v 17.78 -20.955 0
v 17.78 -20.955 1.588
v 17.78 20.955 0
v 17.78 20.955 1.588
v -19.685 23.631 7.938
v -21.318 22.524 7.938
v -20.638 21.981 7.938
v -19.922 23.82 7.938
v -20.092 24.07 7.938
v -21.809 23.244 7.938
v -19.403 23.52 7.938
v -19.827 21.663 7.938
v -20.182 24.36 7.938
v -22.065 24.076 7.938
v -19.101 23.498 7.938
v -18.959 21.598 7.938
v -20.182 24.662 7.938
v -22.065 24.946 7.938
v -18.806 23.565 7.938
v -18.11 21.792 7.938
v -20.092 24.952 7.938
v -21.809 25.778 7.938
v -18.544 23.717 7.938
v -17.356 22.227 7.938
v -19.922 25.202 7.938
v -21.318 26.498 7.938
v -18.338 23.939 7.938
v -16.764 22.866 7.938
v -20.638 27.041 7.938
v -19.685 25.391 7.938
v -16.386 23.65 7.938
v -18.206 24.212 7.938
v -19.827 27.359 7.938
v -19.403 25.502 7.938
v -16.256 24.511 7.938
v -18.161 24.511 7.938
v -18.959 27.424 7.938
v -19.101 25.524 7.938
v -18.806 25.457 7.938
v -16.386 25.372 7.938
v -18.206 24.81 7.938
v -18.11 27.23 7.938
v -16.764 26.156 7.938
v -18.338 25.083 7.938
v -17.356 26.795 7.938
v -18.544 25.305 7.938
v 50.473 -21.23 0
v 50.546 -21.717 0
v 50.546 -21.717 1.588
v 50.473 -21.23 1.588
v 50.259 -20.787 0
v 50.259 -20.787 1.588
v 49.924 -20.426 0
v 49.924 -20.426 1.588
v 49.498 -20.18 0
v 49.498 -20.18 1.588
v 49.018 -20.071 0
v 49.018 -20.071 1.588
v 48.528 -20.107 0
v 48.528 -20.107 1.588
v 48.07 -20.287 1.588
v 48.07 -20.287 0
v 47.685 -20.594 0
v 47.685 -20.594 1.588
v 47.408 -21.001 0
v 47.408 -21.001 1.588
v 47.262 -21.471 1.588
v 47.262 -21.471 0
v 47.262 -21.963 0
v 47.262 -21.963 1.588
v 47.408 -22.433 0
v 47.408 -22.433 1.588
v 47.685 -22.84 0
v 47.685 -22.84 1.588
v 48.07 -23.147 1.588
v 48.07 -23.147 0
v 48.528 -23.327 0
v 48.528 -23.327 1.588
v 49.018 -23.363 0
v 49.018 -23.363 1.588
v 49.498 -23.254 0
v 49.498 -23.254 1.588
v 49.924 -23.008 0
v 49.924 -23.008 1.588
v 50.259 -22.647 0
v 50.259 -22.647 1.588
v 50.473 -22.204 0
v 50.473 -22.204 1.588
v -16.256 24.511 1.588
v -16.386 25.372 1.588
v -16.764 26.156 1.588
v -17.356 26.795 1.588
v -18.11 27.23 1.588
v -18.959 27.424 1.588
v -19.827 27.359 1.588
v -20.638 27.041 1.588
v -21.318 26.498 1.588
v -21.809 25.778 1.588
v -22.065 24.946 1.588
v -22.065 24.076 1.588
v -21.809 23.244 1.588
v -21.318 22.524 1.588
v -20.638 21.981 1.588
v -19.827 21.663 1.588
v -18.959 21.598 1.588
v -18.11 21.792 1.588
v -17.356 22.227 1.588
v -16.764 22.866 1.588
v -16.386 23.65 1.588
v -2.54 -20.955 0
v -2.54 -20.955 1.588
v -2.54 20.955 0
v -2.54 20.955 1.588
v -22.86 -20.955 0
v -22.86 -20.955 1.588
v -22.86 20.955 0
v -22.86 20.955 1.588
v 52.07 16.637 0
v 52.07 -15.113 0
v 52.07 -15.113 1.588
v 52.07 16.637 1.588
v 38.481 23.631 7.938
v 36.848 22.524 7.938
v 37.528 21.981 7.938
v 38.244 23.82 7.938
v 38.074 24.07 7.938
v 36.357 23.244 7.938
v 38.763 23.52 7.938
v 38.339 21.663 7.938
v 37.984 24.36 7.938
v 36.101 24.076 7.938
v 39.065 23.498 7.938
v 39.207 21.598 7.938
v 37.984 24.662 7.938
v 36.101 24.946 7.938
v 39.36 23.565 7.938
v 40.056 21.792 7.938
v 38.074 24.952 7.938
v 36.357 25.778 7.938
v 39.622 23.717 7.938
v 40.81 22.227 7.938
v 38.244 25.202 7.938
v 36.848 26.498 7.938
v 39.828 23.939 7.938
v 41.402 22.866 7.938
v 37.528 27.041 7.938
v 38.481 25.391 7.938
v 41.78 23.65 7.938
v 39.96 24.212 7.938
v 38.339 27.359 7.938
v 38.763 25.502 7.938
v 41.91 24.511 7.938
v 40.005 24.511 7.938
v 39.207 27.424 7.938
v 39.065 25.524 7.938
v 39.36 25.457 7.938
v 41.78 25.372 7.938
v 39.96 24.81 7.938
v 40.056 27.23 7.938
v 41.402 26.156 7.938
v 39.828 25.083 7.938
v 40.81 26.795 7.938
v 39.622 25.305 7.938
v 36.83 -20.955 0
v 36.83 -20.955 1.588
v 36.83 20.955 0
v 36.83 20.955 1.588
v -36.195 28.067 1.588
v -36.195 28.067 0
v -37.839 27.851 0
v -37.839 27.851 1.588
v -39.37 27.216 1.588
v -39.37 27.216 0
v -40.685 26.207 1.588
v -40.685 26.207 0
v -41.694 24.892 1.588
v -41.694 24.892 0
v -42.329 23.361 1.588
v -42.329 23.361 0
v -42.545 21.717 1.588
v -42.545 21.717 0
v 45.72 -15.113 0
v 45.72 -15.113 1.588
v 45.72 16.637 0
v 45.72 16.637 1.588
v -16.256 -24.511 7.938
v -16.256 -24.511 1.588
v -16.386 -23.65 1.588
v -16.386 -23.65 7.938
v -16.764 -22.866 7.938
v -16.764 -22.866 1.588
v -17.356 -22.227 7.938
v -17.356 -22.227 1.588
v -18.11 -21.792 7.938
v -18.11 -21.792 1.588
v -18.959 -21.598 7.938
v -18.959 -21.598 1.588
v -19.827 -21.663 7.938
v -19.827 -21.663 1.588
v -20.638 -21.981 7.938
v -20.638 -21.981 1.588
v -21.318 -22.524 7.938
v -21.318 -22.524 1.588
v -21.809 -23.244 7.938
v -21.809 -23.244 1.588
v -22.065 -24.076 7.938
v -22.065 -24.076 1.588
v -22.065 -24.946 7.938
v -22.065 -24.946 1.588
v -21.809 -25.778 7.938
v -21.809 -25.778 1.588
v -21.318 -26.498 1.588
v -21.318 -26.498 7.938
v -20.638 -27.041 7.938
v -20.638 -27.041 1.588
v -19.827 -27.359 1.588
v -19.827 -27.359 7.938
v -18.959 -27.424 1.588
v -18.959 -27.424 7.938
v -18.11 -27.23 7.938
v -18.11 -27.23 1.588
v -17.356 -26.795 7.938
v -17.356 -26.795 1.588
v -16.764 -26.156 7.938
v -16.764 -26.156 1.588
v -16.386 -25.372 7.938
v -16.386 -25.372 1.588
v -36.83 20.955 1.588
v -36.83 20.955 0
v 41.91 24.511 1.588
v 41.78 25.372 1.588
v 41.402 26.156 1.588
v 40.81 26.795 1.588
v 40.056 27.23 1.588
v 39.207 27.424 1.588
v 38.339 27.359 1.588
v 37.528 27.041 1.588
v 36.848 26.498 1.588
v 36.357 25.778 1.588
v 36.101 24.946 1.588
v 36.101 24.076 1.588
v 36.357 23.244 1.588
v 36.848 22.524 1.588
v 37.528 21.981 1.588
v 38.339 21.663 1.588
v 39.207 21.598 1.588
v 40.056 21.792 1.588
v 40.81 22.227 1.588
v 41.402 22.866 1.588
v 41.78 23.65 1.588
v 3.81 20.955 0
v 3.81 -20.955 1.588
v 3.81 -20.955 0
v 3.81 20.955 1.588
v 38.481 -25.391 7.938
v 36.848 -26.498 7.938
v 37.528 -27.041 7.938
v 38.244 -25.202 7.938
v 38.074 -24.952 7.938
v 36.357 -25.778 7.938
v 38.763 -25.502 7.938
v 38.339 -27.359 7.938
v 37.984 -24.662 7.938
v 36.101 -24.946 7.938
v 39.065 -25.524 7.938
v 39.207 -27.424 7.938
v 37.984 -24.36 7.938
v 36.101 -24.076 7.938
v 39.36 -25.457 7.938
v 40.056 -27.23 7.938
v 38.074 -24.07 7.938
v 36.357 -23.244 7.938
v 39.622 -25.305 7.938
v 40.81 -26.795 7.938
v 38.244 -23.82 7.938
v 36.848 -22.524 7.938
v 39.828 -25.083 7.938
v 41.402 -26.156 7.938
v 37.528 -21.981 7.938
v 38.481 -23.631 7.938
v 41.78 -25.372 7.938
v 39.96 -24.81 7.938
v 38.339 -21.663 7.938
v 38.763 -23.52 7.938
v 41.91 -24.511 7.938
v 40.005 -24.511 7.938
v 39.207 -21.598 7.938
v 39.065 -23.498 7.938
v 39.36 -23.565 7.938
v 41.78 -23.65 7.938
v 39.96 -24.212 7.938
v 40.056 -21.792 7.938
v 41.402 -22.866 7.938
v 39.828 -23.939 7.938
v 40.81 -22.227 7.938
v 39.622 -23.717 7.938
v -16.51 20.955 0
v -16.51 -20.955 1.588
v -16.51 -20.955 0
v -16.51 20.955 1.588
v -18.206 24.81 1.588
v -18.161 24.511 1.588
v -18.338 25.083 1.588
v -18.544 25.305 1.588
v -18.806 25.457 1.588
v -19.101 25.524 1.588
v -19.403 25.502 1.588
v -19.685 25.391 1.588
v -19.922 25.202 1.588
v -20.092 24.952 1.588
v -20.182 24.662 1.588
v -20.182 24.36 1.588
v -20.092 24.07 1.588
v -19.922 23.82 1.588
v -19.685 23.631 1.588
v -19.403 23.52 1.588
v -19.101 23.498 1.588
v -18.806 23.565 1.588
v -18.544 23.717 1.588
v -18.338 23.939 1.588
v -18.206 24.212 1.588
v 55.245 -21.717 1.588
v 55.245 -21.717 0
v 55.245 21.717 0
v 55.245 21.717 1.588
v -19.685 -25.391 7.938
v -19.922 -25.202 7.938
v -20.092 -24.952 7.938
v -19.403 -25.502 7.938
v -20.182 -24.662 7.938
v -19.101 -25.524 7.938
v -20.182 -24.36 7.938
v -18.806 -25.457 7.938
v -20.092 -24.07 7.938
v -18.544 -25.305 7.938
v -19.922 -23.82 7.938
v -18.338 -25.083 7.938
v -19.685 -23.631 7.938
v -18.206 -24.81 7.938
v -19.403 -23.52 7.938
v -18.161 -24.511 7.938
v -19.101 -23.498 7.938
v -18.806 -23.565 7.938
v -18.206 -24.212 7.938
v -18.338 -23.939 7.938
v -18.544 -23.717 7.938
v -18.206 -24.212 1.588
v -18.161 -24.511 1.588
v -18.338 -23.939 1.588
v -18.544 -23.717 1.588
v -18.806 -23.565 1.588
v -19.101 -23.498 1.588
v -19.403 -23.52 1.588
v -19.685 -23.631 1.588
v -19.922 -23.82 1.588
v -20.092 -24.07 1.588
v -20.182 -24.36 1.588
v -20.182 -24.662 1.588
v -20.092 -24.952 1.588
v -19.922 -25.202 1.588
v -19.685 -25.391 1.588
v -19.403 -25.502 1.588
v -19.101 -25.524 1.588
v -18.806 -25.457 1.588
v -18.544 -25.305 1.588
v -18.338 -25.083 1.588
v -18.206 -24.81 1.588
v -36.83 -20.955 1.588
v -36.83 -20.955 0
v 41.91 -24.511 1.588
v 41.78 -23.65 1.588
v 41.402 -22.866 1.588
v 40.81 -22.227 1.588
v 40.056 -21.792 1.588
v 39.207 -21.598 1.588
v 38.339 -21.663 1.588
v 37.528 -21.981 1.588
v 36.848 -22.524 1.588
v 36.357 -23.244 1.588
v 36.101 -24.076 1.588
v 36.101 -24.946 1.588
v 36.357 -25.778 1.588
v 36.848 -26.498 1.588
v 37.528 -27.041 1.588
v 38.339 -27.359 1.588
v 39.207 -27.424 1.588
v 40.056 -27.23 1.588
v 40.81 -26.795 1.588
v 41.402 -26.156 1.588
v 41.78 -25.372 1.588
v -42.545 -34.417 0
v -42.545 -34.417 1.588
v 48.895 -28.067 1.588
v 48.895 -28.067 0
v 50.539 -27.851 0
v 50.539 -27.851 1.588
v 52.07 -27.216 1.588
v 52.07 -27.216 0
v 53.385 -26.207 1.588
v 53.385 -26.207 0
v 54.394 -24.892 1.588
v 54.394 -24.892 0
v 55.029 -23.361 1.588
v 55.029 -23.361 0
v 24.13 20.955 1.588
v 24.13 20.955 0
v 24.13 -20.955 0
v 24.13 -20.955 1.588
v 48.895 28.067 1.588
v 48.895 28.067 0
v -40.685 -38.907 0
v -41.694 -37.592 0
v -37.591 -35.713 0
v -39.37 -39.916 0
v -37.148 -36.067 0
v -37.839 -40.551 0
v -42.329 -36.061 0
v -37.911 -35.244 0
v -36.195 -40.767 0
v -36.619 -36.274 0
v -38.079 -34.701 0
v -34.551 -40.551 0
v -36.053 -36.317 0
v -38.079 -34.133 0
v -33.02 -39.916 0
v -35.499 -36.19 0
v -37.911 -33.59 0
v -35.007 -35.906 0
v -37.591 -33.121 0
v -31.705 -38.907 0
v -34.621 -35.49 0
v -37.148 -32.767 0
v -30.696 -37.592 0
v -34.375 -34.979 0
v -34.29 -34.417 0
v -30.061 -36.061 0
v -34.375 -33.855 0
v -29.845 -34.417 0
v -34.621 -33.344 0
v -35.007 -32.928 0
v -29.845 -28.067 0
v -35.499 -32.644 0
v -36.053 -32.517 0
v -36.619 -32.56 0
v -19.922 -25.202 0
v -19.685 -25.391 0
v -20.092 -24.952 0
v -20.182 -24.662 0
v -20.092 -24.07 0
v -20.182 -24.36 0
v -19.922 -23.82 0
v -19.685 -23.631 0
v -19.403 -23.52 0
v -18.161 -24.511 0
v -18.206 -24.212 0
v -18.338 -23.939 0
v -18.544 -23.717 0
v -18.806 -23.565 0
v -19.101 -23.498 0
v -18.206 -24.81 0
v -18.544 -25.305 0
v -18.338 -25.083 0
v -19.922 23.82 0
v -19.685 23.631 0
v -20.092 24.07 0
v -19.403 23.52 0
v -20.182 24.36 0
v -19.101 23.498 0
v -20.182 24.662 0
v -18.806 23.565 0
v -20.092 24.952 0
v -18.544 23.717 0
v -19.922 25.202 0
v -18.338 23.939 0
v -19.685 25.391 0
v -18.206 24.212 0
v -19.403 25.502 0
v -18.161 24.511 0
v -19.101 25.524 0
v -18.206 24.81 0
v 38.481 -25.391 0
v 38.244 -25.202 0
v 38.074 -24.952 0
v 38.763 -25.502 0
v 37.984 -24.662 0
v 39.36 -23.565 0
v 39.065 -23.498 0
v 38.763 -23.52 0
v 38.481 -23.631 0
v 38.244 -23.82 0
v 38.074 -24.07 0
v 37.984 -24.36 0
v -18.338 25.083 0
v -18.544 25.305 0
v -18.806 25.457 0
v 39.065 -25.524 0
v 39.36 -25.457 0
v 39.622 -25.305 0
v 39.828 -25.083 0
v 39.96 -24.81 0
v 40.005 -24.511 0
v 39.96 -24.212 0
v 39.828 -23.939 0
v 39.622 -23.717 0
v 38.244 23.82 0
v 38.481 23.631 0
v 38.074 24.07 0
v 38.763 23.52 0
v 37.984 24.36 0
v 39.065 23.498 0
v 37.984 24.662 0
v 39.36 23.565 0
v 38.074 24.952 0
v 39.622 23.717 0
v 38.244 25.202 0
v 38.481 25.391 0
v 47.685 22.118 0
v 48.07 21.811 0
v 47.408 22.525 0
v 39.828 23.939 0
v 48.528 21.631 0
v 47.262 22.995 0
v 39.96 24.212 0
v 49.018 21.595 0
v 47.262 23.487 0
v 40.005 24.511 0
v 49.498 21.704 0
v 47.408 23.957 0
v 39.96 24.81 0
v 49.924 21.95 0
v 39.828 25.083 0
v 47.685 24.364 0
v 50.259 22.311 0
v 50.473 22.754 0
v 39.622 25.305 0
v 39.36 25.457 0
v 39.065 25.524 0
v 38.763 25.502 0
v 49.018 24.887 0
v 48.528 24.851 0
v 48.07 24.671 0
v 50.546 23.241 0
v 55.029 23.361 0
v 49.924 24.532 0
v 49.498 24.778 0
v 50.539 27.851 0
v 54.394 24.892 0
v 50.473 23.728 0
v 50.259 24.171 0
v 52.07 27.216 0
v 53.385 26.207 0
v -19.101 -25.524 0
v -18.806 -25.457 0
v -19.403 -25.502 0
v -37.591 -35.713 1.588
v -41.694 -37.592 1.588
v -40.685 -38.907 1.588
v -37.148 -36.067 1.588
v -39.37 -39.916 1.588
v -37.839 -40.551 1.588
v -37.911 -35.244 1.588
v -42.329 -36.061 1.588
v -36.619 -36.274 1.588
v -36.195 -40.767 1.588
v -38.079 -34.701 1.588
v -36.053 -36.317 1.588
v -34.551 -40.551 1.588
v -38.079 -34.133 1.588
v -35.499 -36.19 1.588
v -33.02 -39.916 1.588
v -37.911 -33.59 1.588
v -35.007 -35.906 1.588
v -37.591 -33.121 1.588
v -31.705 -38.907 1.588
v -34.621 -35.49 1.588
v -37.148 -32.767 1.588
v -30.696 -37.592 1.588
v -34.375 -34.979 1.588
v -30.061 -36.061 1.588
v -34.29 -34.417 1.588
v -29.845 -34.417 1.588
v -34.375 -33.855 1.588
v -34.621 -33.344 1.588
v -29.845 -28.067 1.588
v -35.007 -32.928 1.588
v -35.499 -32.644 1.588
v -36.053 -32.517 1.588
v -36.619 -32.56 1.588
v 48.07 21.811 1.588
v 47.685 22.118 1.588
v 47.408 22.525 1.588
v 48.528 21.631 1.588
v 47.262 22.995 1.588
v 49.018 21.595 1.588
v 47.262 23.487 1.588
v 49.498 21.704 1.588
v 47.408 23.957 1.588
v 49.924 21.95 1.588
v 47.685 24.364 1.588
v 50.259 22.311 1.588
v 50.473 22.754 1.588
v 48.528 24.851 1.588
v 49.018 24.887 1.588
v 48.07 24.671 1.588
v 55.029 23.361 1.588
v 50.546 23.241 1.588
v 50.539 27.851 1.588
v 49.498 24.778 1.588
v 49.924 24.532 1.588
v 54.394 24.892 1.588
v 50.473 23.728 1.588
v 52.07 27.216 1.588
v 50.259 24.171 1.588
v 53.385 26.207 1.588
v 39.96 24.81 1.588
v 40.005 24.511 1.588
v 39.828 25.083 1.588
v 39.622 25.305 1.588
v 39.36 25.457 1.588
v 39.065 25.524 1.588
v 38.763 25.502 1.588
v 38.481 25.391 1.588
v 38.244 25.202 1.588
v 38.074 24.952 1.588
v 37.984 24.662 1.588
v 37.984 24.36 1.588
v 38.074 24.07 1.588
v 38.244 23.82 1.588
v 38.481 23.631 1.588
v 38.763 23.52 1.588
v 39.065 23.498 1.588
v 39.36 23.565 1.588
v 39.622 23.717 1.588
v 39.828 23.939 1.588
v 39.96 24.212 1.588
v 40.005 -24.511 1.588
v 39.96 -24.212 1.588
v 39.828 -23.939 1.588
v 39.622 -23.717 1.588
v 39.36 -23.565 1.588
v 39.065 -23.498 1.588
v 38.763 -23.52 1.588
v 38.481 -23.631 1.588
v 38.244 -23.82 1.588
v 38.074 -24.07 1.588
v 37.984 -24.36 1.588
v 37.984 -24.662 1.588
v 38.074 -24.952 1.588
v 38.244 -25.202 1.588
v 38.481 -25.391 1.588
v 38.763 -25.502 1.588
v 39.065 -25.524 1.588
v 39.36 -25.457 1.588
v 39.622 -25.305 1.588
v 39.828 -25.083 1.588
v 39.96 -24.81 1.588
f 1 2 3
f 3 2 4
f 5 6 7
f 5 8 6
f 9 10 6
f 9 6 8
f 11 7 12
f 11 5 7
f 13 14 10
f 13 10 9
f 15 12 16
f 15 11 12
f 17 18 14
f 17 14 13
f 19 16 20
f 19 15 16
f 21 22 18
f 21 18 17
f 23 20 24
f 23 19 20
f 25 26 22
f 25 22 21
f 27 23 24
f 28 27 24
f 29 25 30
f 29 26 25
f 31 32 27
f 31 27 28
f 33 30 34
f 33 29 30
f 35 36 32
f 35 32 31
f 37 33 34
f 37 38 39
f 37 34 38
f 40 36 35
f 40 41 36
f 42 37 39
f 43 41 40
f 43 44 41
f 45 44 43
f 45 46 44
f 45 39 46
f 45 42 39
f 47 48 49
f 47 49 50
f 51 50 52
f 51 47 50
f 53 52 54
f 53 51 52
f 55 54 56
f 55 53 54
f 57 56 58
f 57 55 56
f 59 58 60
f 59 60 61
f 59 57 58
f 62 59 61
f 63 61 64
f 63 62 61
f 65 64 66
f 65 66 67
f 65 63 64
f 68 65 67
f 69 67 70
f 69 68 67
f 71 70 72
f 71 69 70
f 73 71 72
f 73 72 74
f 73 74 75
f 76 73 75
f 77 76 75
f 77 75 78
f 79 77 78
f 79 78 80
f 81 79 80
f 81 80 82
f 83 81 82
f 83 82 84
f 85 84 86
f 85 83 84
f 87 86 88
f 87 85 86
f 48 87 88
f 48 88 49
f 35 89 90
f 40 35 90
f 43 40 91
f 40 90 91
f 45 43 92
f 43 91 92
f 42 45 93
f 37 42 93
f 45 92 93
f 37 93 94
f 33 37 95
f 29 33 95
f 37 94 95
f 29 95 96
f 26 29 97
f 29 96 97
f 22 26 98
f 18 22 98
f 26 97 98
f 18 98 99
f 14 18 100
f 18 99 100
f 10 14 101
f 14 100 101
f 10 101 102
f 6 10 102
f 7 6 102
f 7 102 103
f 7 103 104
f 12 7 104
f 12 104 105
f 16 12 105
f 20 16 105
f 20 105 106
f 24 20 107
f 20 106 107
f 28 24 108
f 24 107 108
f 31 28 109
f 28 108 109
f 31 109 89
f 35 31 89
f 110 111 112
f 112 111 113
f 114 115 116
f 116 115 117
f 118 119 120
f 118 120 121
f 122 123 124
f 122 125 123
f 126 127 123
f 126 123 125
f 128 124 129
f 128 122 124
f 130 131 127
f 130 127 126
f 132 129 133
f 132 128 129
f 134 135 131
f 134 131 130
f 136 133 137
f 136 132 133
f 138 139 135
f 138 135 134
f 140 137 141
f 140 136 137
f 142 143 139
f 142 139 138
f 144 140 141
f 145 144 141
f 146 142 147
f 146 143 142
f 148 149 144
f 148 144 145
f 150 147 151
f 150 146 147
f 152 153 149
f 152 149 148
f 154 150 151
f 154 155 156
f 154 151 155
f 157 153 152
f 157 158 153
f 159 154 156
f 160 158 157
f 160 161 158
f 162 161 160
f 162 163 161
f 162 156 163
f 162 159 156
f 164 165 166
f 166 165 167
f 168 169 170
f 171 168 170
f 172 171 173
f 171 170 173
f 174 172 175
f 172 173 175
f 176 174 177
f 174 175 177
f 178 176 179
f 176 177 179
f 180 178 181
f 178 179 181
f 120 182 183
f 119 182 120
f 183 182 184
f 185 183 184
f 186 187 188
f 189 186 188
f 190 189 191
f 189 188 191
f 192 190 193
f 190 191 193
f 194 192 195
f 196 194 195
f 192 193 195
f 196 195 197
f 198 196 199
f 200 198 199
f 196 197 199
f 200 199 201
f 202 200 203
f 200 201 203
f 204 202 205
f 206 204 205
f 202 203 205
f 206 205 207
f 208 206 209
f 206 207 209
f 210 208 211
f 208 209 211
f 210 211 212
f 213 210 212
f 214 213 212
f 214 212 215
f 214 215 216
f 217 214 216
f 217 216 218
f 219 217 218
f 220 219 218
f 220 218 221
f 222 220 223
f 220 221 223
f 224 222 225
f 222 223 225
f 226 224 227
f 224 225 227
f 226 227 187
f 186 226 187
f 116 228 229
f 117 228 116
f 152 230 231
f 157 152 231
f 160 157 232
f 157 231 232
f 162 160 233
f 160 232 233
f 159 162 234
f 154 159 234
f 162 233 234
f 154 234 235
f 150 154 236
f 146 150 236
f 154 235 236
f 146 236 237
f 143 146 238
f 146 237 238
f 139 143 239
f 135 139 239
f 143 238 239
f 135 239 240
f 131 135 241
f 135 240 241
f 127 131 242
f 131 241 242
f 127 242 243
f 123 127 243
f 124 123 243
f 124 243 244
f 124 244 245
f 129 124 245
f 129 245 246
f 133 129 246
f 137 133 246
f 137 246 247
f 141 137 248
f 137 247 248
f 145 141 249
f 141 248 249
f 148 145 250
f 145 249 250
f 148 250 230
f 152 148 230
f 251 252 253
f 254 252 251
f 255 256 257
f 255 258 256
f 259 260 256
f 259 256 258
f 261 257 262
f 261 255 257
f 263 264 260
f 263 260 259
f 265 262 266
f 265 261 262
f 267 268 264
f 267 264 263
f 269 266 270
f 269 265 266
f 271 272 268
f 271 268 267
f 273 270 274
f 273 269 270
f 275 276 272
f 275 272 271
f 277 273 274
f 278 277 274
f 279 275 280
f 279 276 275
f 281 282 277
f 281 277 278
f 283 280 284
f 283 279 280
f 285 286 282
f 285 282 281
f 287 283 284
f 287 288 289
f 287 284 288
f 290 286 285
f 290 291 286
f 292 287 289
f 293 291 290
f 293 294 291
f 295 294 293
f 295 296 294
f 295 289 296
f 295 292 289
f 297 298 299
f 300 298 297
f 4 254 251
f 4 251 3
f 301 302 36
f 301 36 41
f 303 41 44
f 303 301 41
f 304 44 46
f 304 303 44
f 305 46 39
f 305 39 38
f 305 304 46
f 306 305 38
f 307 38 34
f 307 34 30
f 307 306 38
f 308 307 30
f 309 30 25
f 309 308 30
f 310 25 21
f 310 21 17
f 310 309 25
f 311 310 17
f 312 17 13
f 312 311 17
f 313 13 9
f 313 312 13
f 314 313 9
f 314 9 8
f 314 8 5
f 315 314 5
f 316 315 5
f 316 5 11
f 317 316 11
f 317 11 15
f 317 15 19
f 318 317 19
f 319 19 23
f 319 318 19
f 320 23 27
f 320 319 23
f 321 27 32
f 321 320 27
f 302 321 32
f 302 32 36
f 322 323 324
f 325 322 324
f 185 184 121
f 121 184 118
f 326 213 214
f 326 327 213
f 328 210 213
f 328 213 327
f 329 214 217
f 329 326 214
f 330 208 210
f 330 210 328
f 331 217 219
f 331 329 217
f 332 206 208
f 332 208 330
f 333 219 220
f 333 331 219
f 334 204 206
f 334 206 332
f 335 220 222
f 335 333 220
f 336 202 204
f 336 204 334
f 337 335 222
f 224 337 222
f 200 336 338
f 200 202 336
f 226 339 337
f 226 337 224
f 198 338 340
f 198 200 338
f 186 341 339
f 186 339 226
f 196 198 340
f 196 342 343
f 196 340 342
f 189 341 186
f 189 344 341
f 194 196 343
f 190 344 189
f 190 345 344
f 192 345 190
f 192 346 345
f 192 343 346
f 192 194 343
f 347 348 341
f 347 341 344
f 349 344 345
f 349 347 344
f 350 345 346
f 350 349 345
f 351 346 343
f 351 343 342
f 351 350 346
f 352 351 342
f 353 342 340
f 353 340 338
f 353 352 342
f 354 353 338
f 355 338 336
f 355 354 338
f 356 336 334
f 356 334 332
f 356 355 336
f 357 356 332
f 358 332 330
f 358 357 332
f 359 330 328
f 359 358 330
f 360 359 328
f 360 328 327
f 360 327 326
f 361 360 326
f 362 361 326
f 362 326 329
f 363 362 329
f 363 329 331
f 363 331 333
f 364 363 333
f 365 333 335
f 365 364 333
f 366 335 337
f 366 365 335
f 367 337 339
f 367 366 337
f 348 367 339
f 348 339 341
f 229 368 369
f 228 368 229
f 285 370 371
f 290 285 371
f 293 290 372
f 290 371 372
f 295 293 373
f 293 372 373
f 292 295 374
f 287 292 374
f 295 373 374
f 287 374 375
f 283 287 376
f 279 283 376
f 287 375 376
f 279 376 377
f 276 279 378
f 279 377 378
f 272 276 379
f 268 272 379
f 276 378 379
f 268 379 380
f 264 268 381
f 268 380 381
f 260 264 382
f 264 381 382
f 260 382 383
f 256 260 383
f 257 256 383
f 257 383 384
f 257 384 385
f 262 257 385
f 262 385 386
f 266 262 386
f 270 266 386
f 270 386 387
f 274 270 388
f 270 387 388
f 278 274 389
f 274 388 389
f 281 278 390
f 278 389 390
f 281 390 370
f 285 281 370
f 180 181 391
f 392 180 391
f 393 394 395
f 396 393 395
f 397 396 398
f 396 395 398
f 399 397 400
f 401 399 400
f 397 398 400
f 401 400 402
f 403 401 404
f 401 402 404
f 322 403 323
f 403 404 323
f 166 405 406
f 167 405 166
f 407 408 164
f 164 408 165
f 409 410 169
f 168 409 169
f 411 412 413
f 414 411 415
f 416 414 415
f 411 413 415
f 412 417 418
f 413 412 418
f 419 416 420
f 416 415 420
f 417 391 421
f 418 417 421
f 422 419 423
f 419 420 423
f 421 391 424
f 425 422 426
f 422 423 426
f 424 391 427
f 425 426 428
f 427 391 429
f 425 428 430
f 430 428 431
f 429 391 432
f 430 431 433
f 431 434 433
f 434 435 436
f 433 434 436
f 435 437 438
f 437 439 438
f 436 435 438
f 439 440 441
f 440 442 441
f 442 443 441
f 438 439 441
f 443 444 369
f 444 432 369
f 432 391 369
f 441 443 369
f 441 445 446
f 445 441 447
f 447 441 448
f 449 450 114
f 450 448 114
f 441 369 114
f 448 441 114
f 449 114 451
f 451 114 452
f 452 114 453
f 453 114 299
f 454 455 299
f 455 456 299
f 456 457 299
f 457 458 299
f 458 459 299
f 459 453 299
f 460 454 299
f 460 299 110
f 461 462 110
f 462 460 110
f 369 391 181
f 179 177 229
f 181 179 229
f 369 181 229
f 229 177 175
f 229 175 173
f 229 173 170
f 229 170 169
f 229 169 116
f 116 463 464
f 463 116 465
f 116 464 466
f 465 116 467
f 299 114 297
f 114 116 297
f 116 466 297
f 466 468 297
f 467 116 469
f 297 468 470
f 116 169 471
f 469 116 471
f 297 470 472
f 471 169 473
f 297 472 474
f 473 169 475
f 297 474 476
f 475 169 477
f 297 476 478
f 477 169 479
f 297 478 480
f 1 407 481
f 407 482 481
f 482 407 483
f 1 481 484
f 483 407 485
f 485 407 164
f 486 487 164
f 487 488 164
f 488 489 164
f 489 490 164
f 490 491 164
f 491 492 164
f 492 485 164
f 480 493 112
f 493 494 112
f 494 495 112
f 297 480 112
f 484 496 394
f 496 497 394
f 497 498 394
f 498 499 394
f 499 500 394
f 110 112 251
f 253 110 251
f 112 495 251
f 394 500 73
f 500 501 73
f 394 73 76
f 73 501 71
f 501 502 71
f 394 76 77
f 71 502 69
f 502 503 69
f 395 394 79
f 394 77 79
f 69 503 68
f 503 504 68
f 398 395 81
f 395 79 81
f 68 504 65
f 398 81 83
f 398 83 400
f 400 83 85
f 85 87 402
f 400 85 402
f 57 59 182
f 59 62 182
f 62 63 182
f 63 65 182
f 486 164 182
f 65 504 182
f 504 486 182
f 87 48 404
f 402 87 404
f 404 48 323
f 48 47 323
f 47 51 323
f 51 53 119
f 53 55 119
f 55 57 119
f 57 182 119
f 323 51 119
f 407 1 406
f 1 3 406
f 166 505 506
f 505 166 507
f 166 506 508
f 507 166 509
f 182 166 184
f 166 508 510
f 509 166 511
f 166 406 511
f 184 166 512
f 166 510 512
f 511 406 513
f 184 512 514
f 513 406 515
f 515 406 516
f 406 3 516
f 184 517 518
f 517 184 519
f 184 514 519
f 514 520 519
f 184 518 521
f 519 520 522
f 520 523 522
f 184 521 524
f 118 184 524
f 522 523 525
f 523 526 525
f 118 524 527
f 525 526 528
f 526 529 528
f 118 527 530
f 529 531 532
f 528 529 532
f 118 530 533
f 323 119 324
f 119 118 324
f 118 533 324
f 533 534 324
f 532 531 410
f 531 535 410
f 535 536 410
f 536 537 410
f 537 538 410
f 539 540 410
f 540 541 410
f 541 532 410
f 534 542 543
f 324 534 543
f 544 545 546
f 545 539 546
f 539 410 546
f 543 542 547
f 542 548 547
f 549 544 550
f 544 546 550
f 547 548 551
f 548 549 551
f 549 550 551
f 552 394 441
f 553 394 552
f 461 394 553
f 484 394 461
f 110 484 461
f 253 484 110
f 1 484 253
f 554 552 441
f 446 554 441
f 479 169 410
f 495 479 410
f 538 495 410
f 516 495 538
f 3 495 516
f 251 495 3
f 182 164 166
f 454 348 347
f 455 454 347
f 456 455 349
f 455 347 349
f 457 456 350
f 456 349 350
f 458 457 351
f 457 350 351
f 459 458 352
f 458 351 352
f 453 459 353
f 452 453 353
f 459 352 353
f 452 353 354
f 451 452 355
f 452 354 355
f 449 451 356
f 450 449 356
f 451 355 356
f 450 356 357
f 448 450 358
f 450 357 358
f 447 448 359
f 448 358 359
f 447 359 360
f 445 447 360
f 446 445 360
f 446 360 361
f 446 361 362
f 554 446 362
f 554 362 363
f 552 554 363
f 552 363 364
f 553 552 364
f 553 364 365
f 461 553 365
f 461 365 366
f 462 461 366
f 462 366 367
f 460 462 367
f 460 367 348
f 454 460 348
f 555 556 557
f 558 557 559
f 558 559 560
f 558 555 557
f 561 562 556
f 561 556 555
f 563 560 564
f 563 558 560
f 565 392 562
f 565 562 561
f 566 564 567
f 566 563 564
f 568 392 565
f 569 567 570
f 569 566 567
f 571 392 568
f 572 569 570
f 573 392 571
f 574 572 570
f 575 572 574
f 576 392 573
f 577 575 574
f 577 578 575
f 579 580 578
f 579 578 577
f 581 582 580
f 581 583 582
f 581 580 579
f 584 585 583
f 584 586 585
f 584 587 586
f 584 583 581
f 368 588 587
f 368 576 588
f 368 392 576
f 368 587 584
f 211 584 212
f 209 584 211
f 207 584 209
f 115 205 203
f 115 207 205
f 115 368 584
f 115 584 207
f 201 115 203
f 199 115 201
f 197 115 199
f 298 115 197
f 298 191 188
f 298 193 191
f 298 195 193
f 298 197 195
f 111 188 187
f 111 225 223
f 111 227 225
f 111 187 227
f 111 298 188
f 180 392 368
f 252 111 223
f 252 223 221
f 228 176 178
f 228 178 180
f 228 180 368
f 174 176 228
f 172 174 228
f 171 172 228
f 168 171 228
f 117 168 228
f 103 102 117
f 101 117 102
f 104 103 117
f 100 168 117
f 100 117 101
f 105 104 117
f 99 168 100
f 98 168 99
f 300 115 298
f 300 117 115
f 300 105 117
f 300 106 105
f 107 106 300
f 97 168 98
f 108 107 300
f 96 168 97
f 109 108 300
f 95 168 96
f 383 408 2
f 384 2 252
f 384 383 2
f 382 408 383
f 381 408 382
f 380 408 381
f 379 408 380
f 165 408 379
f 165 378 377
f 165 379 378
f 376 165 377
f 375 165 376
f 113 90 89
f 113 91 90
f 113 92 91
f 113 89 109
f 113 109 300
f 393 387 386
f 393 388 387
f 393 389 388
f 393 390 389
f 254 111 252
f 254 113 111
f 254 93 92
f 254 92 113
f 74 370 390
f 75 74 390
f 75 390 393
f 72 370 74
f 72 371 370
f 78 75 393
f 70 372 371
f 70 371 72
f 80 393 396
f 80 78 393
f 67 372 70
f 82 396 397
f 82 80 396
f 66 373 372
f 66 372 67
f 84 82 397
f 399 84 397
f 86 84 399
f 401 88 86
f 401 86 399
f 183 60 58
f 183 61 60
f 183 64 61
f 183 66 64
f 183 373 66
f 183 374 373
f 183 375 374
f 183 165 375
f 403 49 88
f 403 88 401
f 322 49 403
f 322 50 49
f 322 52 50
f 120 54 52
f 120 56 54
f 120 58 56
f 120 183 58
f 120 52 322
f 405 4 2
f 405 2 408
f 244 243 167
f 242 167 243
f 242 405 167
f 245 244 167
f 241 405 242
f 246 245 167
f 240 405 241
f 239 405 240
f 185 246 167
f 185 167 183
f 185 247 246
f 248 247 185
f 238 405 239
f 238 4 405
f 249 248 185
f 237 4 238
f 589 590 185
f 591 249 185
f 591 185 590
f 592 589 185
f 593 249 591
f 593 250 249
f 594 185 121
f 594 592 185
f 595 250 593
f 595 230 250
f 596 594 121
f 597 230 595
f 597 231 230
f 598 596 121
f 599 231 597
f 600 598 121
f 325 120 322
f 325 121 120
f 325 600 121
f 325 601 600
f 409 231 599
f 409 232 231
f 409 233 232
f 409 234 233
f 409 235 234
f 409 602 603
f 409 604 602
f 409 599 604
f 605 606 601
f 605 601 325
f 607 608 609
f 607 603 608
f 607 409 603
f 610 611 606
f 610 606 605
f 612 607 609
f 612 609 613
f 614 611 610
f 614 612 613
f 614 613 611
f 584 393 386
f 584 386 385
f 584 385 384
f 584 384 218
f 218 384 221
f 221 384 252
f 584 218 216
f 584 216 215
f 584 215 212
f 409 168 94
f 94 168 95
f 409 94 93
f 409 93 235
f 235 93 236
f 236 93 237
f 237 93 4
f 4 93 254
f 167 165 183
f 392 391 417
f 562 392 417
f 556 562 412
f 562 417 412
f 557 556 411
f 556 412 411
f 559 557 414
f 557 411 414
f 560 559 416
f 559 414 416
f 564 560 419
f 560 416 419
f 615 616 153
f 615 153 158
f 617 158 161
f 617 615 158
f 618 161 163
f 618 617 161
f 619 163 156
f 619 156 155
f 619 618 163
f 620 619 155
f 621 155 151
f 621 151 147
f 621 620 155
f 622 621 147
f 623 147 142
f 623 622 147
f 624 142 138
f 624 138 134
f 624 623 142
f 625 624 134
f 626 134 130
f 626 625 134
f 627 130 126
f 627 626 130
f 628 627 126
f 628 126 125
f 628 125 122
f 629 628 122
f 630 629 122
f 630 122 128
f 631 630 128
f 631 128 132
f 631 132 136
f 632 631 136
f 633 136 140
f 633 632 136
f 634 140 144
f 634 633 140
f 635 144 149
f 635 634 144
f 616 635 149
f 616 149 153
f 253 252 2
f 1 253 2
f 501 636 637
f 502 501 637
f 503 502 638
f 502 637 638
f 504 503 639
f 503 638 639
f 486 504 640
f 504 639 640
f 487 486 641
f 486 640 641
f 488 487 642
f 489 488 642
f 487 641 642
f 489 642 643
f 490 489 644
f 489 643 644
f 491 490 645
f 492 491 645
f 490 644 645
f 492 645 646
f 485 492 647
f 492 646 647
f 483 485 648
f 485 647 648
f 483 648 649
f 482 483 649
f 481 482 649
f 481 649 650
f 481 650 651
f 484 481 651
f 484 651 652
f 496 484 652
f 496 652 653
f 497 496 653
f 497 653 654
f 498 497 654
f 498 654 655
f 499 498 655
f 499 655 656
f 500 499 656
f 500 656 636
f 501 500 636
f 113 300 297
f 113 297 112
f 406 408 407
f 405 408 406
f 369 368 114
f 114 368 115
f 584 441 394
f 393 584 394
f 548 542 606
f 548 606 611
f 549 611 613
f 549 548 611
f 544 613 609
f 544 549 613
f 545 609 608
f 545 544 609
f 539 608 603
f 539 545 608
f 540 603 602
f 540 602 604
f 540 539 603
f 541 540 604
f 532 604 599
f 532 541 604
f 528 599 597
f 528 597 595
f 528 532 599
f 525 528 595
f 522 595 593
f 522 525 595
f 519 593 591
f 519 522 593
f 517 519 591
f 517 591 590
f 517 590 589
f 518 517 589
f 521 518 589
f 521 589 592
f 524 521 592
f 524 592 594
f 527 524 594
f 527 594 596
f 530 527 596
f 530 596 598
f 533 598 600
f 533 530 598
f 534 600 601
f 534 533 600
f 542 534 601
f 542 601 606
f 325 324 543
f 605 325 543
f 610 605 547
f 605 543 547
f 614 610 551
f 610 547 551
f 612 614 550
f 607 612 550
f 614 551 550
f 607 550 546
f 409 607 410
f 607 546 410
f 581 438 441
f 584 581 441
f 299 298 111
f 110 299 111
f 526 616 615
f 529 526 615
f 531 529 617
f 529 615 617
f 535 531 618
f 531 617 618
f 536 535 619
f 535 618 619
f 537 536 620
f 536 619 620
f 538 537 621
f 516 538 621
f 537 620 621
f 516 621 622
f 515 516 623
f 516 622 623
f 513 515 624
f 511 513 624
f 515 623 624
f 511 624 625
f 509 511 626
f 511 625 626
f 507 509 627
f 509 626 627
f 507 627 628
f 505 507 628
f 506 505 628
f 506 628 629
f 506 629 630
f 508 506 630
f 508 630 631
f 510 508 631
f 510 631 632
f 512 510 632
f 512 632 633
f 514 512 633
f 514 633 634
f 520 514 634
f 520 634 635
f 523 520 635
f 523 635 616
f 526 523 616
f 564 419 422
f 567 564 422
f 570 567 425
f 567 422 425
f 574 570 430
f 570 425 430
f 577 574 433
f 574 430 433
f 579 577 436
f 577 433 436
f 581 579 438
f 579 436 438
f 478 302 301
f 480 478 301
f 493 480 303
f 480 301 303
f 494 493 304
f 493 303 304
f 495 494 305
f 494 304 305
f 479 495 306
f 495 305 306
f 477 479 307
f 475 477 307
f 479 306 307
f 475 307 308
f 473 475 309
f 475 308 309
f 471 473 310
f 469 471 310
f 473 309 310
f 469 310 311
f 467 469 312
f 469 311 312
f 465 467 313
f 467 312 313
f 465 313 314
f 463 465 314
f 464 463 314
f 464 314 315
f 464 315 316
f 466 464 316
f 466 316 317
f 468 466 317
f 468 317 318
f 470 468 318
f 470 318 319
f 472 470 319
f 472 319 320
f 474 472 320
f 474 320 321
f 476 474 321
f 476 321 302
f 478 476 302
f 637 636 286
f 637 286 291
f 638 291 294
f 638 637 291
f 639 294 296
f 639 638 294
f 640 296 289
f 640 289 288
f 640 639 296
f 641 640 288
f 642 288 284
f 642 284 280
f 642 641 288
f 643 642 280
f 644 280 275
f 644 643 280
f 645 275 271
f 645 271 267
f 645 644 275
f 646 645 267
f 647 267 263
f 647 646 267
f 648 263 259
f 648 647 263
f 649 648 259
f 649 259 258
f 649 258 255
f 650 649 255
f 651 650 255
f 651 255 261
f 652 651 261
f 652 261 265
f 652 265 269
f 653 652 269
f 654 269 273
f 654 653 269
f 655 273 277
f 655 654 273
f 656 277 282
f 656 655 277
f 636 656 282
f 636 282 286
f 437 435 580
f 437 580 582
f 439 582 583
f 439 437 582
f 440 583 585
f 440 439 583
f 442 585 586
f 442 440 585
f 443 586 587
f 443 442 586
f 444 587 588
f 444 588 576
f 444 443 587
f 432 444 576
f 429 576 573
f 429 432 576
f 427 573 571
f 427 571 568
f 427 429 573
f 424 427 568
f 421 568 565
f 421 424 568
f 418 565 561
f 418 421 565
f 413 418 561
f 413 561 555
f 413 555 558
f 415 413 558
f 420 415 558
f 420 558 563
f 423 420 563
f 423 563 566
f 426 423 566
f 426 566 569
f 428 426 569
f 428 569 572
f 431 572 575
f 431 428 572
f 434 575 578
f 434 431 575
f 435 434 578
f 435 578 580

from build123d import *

# Parameters (mm, degrees)
F0_R     = 1.651
F0_W     = 6.35
F0_H     = 31.75
F0_R_2   = 1.905
F1_DEPTH = 1.5875
F2_W     = 12.7
F2_H     = 41.91
F2_W_2   = 13.97
F3_DEPTH = 6.35
F4_R     = 2.921
F4_R_2   = 1.016
F5_DEPTH = 6.35
F6_DEPTH = 6.35


with BuildPart() as f1:
    # F0 (on Top) → F1 (new body)
    with BuildSketch(Plane.XY):
        with BuildLine():
            Line((42.545, -28.067), (42.545, 28.067))
            Line((42.545, 28.067), (-36.195, 28.067))
            ThreePointArc((-36.195, 28.067), (-40.6851280605, 26.2071280605), (-42.545, 21.717))
            Line((-42.545, 21.717), (-42.545, -28.067))
            Line((-42.545, -28.067), (-29.845, -28.067))
            Line((-29.845, -28.067), (42.545, -28.067))
        make_face()
        with BuildLine():
            Line((48.895, 28.067), (42.545, 28.067))
            Line((42.545, 28.067), (42.545, -28.067))
            Line((42.545, -28.067), (48.895, -28.067))
            ThreePointArc((48.895, -28.067), (53.3851280605, -26.2071280605), (55.245, -21.717))
            Line((55.245, -21.717), (55.245, 21.717))
            ThreePointArc((55.245, 21.717), (53.3851280605, 26.2071280605), (48.895, 28.067))
        make_face()
        with Locations((48.895, -21.717)):
            Circle(F0_R, mode=Mode.SUBTRACT)
        with Locations((48.895, 0.762)):
            Rectangle(F0_W, F0_H, mode=Mode.SUBTRACT)
        with Locations((48.895, 23.241)):
            Circle(F0_R, mode=Mode.SUBTRACT)
        with BuildLine():
            Line((-29.845, -34.417), (-29.845, -28.067))
            Line((-29.845, -28.067), (-42.545, -28.067))
            Line((-42.545, -28.067), (-42.545, -34.417))
            ThreePointArc((-42.545, -34.417), (-40.6851280605, -38.9071280605), (-36.195, -40.767))
            ThreePointArc((-36.195, -40.767), (-31.7048719395, -38.9071280605), (-29.845, -34.417))
        make_face()
        with Locations((-36.195, -34.417)):
            Circle(F0_R_2, mode=Mode.SUBTRACT)
    extrude(amount=F1_DEPTH)

    # F2 (on face) → F3 (cut)
    with BuildSketch(Plane.XY.offset(1.5875)):
        with Locations((30.48, 0)):
            Rectangle(F2_W, F2_H)
        with Locations((10.795, 0)):
            Rectangle(F2_W_2, F2_H)
        with Locations((-9.525, 0)):
            Rectangle(F2_W_2, F2_H)
        with Locations((-29.845, 0)):
            Rectangle(F2_W_2, F2_H)
    extrude(amount=-F3_DEPTH, mode=Mode.SUBTRACT)

    # F4 (on face) → F5 (join)
    with BuildSketch(Plane.XY.offset(1.5875)):
        with Locations((38.989, 24.511)):
            Circle(F4_R)
        with Locations((38.989, 24.511)):
            Circle(F4_R_2, mode=Mode.SUBTRACT)
        with Locations((38.989, -24.511)):
            Circle(F4_R)
        with Locations((38.989, -24.511)):
            Circle(F4_R_2, mode=Mode.SUBTRACT)
        with Locations((-19.177, 24.511)):
            Circle(F4_R)
        with Locations((-19.177, 24.511)):
            Circle(F4_R_2, mode=Mode.SUBTRACT)
        with Locations((-19.177, -24.511)):
            Circle(F4_R)
        with Locations((-19.177, -24.511)):
            Circle(F4_R_2, mode=Mode.SUBTRACT)
    extrude(amount=F5_DEPTH)

    # F4 (on face) → F6 (cut)
    with BuildSketch(Plane.XY.offset(1.5875)):
        with Locations((38.989, -24.511)):
            Circle(F4_R_2)
        with Locations((-19.177, 24.511)):
            Circle(F4_R_2)
        with Locations((38.989, 24.511)):
            Circle(F4_R_2)
        with Locations((-19.177, -24.511)):
            Circle(F4_R_2)
    extrude(amount=-F6_DEPTH, mode=Mode.SUBTRACT)


solid = f1.part
